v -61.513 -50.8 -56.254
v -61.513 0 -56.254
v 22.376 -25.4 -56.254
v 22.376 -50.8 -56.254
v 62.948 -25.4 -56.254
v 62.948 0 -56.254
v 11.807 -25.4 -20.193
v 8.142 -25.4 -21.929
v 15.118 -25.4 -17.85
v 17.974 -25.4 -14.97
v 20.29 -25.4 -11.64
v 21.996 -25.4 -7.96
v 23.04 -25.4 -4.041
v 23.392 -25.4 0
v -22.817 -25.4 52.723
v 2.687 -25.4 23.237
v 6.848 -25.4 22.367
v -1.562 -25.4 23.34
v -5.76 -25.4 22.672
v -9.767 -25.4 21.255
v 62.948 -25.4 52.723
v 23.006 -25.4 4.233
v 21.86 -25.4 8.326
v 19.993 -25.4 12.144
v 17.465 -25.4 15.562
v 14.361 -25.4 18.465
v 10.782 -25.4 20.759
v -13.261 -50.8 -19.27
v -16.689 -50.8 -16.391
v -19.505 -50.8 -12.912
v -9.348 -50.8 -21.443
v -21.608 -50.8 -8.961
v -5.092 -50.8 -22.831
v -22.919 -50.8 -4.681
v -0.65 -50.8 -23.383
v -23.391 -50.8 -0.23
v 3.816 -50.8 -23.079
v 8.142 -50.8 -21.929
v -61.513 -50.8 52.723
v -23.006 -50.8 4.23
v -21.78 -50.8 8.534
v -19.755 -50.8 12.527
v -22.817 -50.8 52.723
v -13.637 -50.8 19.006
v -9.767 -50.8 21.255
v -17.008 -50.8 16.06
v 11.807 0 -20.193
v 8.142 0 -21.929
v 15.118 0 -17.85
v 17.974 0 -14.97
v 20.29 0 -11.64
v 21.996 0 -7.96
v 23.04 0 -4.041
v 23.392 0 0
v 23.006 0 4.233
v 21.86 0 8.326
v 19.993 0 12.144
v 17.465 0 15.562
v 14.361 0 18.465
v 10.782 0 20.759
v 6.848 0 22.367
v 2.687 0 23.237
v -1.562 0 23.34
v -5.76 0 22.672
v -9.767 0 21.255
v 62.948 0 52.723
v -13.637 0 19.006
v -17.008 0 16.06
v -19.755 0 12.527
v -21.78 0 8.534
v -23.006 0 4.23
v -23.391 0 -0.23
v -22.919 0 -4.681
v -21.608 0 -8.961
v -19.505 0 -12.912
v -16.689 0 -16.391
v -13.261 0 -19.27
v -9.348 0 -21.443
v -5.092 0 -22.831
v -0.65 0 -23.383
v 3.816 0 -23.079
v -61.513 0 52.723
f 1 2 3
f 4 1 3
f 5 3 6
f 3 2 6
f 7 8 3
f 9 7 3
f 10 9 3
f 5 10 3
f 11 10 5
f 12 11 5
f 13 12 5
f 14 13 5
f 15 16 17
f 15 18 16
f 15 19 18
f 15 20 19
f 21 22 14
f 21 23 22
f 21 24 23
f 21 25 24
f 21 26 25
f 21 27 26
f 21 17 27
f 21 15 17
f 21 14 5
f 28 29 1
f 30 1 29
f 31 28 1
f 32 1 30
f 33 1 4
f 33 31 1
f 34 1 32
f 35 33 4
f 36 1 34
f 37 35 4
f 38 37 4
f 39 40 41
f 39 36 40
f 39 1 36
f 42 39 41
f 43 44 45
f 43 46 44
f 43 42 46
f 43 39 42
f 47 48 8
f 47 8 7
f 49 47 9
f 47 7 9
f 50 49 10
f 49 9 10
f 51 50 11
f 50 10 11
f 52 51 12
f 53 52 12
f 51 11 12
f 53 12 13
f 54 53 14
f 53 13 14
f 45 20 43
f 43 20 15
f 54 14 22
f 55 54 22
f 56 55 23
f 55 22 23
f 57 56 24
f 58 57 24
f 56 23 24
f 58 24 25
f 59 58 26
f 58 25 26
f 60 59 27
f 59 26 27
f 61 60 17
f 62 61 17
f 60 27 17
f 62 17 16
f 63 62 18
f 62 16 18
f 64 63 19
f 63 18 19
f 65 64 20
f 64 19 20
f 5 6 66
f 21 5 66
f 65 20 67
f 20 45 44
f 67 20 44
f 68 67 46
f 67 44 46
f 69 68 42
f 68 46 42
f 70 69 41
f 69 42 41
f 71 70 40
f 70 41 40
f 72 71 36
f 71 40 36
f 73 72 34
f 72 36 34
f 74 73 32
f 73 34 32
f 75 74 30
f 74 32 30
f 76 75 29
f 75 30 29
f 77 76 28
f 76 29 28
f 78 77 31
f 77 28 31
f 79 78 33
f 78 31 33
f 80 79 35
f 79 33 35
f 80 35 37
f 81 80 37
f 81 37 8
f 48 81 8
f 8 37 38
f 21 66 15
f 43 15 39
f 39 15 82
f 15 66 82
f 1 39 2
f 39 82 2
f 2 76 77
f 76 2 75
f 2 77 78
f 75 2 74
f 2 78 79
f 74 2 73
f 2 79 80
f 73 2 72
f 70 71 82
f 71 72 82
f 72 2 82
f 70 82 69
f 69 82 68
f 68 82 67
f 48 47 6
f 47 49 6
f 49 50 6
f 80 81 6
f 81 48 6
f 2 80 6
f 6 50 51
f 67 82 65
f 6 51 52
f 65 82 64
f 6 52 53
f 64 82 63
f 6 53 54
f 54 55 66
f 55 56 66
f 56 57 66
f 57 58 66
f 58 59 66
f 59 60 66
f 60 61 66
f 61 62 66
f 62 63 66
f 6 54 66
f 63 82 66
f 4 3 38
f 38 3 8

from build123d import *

# Parameters (mm, degrees)
F0_W     = 124.46073
F0_H     = 108.976554
F1_DEPTH = 25.4
F3_DEPTH = 25.4
F5_DEPTH = 50.801


with BuildPart() as f1:
    # F0 (on Front) → F1 (new body)
    with BuildSketch(Plane.XZ):
        with Locations((0.717355, -1.765637)):
            Rectangle(F0_W, F0_H)
    extrude(amount=F1_DEPTH)

    # F2 (on face) → F3 (join)
    with BuildSketch(Plane.XZ.offset(25.4)):
        Polygon((22.376237, -56.253914), (-22.816991, 52.72264), (-61.51301, 52.72264), (-61.51301, -56.253914), align=None)
    extrude(amount=F3_DEPTH)

    # F4 (on face) → F5 (cut, through all)
    with BuildSketch(Plane.XZ.offset(50.8)):
        with BuildLine():
            ThreePointArc((8.141664, -21.929417), (19.204633, -13.355452), (23.392008, 0))
            ThreePointArc((23.392008, 0), (12.623583, 19.69343), (-9.767282, 21.255264))
            Line((-9.767282, 21.255264), (8.141664, -21.929417))
        make_face()
        with BuildLine():
            Line((8.141664, -21.929417), (-9.767282, 21.255264))
            ThreePointArc((-9.767282, 21.255264), (-21.607634, -8.960815), (8.141664, -21.929417))
        make_face()
    extrude(amount=-F5_DEPTH, mode=Mode.SUBTRACT)


solid = f1.part
